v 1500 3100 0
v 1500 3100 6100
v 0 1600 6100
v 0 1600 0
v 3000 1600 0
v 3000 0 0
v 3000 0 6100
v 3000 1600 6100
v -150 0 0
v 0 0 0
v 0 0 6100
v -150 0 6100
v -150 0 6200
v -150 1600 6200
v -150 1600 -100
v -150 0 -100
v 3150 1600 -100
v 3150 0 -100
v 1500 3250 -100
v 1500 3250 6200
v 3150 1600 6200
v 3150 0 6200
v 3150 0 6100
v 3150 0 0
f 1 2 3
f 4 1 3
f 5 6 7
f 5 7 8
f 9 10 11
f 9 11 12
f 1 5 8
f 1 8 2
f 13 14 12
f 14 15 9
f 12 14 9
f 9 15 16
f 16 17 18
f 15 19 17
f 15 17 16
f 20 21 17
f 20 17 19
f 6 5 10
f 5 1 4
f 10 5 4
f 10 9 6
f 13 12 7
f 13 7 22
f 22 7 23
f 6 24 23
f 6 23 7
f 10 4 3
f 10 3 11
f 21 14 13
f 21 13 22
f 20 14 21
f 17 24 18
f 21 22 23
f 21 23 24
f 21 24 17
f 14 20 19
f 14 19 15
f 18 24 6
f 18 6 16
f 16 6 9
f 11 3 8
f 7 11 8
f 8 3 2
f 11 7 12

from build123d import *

# Parameters (mm, degrees)
EXTRUDE_1_DEPTH = 6100
EXTRUDE_4_DEPTH = 100
EXTRUDE_5_DEPTH = 100
EXTRUDE_3_DEPTH = 50


with BuildPart() as part:
    # 草图1 → 凸台-拉伸1 (new body)
    with BuildSketch(Plane.XY):
        Polygon((0, 0), (-150, 0), (-150, 1600), (1500.000128285, 3249.999871715), (3150, 1599.999743429), (3150, -0.000256571), (3000, -0.000256571), (3000, 1599.999743429), (1500.000116623, 3099.999860052), (0, 1599.999976675), align=None)
    extrude(amount=EXTRUDE_1_DEPTH)

    # 草图4 → 凸台-拉伸4 (add)
    with BuildSketch(Plane(origin=(0, 0, 0), x_dir=(-1, 0, 0), z_dir=(0, 0, -1))):
        Polygon((-3150, 1599.999743429), (-3150, -0.000256571), (150, 0), (150, 1600), (-1500.000128285, 3249.999871715), align=None)
    extrude(amount=EXTRUDE_4_DEPTH)

    # 草图5 → 凸台-拉伸5 (add)
    with BuildSketch(Plane.XY.offset(6100)):
        Polygon((-150, 1600), (-150, 0), (3150, -0.000256571), (3150, 1599.999743429), (1500.000128285, 3249.999871715), align=None)
    extrude(amount=EXTRUDE_5_DEPTH)

    # 草图3 → 凸台-拉伸3 (add)
    with BuildSketch(Plane(origin=(0, 0, 0), x_dir=(-1, 0, 0), z_dir=(0, 0, -1))):
        Polygon((-3150, 0), (-3150, 1599.999743429), (-1500.000128285, 3249.999871715), (150, 1600), (150, 0), align=None)
    extrude(amount=EXTRUDE_3_DEPTH)


solid = part.part
